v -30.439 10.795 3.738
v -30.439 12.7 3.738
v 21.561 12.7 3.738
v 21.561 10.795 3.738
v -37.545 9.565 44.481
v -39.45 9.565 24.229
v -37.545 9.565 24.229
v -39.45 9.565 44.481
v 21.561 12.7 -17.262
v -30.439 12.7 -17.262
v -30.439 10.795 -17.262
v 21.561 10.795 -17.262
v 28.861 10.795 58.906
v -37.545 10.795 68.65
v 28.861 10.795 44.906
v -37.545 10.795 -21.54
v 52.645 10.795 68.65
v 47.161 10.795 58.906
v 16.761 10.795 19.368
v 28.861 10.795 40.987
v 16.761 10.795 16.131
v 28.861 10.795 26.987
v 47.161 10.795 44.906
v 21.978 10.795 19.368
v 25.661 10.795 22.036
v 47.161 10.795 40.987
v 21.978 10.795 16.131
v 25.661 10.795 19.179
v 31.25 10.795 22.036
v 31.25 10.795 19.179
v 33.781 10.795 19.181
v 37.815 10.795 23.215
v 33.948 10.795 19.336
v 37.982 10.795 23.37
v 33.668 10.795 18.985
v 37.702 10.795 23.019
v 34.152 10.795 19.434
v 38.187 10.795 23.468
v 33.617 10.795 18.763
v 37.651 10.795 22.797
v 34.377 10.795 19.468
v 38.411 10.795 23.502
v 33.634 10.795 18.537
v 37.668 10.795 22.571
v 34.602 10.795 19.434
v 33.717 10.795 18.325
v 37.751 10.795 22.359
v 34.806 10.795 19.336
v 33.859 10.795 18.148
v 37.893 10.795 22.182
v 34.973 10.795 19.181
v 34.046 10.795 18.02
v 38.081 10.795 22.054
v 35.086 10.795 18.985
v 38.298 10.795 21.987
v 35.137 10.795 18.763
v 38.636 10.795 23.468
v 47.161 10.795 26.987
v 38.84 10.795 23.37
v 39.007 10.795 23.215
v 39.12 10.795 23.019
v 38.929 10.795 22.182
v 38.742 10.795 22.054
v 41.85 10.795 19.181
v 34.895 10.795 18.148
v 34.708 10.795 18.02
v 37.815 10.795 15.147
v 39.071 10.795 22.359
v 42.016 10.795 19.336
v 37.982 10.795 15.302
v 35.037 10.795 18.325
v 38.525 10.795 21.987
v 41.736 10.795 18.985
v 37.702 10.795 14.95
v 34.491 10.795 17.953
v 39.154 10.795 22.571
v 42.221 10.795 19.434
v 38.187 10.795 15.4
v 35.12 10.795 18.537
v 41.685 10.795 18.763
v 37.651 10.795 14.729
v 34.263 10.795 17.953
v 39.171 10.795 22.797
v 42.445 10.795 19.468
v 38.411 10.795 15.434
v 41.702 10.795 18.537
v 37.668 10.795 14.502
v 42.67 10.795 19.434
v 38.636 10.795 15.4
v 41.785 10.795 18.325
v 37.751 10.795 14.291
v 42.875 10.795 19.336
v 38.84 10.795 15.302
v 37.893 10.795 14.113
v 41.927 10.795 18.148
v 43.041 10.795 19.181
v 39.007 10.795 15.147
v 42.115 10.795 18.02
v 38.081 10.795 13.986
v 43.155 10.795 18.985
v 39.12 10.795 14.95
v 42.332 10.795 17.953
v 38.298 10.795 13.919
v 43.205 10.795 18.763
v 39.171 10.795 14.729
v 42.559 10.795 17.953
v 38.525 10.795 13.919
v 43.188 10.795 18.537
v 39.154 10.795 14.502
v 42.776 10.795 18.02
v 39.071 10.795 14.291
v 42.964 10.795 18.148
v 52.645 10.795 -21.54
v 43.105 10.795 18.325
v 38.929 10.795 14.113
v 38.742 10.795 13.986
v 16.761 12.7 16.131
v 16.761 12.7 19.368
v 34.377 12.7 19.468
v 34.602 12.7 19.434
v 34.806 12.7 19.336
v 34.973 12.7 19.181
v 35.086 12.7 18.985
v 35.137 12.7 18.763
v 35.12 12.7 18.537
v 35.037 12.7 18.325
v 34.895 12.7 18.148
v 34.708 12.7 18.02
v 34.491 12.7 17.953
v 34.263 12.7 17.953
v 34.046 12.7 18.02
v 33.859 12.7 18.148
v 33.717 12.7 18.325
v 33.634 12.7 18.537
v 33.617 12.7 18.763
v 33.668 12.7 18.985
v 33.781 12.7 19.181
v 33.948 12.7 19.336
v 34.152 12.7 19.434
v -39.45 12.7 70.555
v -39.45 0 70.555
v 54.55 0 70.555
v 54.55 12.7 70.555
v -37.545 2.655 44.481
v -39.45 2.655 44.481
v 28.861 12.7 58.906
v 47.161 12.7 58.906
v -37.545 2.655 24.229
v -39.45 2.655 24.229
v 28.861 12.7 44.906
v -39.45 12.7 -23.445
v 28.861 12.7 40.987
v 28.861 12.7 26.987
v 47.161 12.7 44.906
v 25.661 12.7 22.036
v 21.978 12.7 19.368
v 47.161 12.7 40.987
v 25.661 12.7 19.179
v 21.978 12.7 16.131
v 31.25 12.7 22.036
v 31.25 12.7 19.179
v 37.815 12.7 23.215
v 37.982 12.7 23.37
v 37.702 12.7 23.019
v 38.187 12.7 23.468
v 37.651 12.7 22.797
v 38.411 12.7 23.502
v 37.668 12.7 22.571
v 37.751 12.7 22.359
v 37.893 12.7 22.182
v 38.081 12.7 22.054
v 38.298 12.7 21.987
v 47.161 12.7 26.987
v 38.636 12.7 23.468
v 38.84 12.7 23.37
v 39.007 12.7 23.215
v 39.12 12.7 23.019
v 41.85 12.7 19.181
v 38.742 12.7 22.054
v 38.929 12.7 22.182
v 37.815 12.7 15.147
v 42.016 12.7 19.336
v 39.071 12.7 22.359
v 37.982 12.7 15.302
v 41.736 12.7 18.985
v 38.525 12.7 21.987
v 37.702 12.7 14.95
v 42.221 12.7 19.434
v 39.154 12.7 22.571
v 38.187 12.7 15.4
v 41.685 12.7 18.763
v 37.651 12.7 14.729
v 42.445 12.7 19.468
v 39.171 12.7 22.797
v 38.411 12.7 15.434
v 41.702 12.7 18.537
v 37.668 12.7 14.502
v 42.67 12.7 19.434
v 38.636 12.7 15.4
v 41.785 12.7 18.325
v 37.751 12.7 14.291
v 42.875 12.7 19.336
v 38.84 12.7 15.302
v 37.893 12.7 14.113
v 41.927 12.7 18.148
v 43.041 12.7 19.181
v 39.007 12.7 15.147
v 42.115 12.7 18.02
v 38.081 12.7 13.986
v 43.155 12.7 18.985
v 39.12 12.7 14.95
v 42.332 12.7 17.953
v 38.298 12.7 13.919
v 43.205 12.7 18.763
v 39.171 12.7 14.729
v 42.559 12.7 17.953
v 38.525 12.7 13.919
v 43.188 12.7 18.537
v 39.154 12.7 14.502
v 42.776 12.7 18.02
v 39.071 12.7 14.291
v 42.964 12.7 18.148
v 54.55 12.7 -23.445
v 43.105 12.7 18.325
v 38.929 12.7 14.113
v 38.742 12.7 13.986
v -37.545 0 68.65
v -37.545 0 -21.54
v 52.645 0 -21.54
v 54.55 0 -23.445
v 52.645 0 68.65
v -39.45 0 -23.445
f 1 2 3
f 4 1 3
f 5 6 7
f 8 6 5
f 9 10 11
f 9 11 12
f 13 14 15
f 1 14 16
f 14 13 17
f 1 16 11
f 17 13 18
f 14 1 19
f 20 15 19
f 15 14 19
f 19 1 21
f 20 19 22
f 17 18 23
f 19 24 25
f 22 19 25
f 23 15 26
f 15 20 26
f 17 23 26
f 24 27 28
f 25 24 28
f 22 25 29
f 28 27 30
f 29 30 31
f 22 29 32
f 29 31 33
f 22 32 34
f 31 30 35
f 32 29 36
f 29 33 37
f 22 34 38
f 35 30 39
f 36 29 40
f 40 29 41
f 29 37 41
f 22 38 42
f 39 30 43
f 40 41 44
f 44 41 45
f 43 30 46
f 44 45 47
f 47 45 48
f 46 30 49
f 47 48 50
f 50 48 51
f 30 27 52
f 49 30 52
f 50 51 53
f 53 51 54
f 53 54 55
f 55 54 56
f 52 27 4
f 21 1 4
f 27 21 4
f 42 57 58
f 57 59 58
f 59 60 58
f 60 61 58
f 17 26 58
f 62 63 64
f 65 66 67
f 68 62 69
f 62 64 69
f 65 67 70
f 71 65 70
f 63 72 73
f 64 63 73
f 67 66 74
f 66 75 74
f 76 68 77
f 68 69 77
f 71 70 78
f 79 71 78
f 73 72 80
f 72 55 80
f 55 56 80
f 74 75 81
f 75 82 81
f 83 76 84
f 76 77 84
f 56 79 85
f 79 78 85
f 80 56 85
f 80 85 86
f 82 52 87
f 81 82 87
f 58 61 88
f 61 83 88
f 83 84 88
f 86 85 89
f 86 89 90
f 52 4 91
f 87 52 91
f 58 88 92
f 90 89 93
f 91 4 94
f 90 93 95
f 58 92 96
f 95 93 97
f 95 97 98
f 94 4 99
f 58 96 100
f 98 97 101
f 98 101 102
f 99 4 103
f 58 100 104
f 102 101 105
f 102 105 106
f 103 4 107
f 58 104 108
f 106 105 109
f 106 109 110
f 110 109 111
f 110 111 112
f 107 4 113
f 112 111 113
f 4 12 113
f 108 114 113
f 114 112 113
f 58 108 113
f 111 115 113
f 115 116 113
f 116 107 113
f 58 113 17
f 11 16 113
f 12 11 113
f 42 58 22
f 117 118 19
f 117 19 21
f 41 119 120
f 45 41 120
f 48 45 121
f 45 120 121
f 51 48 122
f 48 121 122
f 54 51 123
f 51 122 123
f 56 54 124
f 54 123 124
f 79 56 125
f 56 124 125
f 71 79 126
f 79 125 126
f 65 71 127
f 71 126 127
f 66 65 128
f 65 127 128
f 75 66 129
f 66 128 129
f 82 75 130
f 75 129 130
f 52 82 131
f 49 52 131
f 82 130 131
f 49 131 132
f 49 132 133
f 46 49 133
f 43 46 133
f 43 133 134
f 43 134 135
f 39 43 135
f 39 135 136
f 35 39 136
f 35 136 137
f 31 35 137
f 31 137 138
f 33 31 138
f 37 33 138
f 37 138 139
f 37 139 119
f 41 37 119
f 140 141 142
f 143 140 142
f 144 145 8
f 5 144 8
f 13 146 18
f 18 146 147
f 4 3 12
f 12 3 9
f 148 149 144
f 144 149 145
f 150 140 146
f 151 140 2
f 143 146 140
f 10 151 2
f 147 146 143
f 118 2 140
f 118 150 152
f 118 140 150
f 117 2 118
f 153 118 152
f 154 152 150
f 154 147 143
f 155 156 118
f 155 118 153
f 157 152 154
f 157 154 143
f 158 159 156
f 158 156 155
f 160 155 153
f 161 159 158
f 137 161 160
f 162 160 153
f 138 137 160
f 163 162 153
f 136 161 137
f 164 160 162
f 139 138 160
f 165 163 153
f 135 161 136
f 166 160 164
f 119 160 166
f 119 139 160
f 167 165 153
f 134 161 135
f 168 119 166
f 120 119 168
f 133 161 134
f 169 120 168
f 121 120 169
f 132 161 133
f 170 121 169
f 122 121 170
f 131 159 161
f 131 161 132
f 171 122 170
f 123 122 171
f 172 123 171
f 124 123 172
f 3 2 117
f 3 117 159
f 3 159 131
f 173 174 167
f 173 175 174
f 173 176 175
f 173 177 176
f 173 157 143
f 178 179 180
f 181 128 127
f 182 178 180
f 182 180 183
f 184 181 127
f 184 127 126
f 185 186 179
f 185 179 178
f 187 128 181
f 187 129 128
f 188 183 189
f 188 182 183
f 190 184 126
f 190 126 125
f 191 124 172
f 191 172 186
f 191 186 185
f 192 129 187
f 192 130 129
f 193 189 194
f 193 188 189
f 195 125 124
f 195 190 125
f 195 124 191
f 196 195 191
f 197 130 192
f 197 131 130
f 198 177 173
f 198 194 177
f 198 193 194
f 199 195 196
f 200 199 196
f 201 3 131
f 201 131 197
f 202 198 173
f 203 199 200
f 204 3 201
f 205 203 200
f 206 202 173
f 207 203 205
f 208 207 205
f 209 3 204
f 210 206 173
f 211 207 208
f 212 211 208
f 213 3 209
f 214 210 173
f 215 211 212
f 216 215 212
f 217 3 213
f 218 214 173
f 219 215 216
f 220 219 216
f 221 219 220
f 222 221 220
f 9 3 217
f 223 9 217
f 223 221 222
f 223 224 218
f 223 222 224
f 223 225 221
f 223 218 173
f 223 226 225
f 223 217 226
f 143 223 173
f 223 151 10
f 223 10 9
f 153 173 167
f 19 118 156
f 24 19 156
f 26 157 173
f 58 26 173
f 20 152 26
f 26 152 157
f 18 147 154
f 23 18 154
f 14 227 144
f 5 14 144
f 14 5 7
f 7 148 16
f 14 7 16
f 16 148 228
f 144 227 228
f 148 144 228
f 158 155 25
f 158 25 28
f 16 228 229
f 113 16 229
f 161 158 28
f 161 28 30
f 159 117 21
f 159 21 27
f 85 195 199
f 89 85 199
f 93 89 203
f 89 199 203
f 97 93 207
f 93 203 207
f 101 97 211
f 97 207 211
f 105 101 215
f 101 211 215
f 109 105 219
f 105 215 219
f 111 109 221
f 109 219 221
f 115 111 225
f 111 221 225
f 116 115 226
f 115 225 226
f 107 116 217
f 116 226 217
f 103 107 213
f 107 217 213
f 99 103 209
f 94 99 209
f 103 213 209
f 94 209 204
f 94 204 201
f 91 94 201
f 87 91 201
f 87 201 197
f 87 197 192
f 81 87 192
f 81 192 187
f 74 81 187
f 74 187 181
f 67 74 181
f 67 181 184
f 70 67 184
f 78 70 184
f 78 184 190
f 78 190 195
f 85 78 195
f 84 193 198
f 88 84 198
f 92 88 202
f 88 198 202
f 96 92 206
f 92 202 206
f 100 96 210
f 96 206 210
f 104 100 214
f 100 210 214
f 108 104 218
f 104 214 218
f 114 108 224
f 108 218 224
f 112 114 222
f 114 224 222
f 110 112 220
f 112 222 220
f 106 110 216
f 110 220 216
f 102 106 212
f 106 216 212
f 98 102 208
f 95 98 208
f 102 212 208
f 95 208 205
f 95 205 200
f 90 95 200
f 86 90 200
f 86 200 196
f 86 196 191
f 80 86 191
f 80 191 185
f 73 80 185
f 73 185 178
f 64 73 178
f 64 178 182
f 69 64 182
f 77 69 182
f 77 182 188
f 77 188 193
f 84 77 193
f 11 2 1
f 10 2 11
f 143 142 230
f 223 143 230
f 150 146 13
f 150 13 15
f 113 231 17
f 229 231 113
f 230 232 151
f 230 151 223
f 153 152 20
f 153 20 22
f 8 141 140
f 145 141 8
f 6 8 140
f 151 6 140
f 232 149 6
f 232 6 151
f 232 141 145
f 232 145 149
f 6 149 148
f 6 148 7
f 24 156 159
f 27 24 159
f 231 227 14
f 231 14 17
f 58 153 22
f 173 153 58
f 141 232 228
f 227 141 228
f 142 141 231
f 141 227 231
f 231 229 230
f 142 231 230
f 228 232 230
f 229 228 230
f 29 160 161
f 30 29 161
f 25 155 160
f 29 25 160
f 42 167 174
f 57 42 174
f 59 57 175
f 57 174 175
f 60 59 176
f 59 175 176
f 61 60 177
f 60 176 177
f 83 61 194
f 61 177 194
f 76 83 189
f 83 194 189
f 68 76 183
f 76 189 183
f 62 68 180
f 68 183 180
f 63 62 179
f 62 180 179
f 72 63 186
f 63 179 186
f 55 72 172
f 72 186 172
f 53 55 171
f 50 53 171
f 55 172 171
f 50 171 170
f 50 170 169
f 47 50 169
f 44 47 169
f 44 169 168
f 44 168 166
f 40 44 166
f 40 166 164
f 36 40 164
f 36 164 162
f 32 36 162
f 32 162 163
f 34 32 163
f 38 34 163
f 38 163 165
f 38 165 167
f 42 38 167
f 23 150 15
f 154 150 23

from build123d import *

# Parameters (mm, degrees)
SKETCH1_W           = 94
SKETCH1_H           = 94
BOSS_EXTRUDE1_DEPTH = 12.7
SHELL3_T            = -1.905
SKETCH2_W           = 52
SKETCH2_H           = 21
SKETCH2_W_2         = 18.3
SKETCH2_H_2         = 14
CUT_EXTRUDE2_DEPTH  = 2.54
SKETCH2_11_R        = 0.762
CUT_EXTRUDE4_DEPTH  = 2.54
SKETCH2_12_W        = 5.216658821
SKETCH2_12_H        = 3.236828516
SKETCH2_12_W_2      = 5.589277308
SKETCH2_12_H_2      = 2.856741735
CUT_EXTRUDE5_DEPTH  = 2.54
SKETCH4_W           = 20.251250208
SKETCH4_H           = 6.910379218
CUT_EXTRUDE6_DEPTH  = 2.54


with BuildPart() as part:
    # Sketch1 → Boss-Extrude1 (new body)
    with BuildSketch(Plane(origin=(0, 0, 0), x_dir=(1, 0, 0), z_dir=(0, 1, 0))):
        with Locations((7.550289017, -23.555105973)):
            Rectangle(SKETCH1_W, SKETCH1_H)
    extrude(amount=BOSS_EXTRUDE1_DEPTH)

    # Shell3
    shell3_openings = [part.faces().sort_by_distance(p)[0] for p in [
        (7.550289017, 0, 23.555105973),
    ]]
    offset(amount=SHELL3_T, openings=shell3_openings, kind=Kind.INTERSECTION)

    # Sketch2 → Cut-Extrude2 (cut)
    with BuildSketch(Plane(origin=(0, 12.7, 0), x_dir=(1, 0, 0), z_dir=(0, 1, 0))):
        with Locations((-4.438857176, 6.761825207)):
            Rectangle(SKETCH2_W, SKETCH2_H)
        with Locations((38.011142824, -33.986529837)):
            Rectangle(SKETCH2_W_2, SKETCH2_H_2)
        with Locations((38.011142824, -51.906174793)):
            Rectangle(SKETCH2_W_2, SKETCH2_H_2)
    extrude(amount=-CUT_EXTRUDE2_DEPTH, mode=Mode.SUBTRACT)

    # Sketch2<11> → Cut-Extrude4 (cut)
    with BuildSketch(Plane(origin=(0, 12.7, 0), x_dir=(1, 0, 0), z_dir=(0, 1, 0))):
        with Locations((38.411142824, -14.672051962)):
            Circle(SKETCH2_11_R)
        with Locations((34.377019993, -18.706174793)):
            Circle(SKETCH2_11_R)
        with Locations((38.411142824, -22.740297623)):
            Circle(SKETCH2_11_R)
        with Locations((42.445265655, -18.706174793)):
            Circle(SKETCH2_11_R)
    extrude(amount=-CUT_EXTRUDE4_DEPTH, mode=Mode.SUBTRACT)

    # Sketch2<12> → Cut-Extrude5 (cut)
    with BuildSketch(Plane(origin=(0, 12.7, 0), x_dir=(1, 0, 0), z_dir=(0, 1, 0))):
        with Locations((19.369472235, -17.749589051)):
            Rectangle(SKETCH2_12_W, SKETCH2_12_H)
        with Locations((28.455781478, -20.607545661)):
            Rectangle(SKETCH2_12_W_2, SKETCH2_12_H_2)
    extrude(amount=-CUT_EXTRUDE5_DEPTH, mode=Mode.SUBTRACT)

    # Sketch4 → Cut-Extrude6 (cut)
    with BuildSketch(Plane.ZY.offset(39.449710983)):
        with Locations((34.355105973, 6.110056277)):
            Rectangle(SKETCH4_W, SKETCH4_H)
    extrude(amount=-CUT_EXTRUDE6_DEPTH, mode=Mode.SUBTRACT)


solid = part.part
